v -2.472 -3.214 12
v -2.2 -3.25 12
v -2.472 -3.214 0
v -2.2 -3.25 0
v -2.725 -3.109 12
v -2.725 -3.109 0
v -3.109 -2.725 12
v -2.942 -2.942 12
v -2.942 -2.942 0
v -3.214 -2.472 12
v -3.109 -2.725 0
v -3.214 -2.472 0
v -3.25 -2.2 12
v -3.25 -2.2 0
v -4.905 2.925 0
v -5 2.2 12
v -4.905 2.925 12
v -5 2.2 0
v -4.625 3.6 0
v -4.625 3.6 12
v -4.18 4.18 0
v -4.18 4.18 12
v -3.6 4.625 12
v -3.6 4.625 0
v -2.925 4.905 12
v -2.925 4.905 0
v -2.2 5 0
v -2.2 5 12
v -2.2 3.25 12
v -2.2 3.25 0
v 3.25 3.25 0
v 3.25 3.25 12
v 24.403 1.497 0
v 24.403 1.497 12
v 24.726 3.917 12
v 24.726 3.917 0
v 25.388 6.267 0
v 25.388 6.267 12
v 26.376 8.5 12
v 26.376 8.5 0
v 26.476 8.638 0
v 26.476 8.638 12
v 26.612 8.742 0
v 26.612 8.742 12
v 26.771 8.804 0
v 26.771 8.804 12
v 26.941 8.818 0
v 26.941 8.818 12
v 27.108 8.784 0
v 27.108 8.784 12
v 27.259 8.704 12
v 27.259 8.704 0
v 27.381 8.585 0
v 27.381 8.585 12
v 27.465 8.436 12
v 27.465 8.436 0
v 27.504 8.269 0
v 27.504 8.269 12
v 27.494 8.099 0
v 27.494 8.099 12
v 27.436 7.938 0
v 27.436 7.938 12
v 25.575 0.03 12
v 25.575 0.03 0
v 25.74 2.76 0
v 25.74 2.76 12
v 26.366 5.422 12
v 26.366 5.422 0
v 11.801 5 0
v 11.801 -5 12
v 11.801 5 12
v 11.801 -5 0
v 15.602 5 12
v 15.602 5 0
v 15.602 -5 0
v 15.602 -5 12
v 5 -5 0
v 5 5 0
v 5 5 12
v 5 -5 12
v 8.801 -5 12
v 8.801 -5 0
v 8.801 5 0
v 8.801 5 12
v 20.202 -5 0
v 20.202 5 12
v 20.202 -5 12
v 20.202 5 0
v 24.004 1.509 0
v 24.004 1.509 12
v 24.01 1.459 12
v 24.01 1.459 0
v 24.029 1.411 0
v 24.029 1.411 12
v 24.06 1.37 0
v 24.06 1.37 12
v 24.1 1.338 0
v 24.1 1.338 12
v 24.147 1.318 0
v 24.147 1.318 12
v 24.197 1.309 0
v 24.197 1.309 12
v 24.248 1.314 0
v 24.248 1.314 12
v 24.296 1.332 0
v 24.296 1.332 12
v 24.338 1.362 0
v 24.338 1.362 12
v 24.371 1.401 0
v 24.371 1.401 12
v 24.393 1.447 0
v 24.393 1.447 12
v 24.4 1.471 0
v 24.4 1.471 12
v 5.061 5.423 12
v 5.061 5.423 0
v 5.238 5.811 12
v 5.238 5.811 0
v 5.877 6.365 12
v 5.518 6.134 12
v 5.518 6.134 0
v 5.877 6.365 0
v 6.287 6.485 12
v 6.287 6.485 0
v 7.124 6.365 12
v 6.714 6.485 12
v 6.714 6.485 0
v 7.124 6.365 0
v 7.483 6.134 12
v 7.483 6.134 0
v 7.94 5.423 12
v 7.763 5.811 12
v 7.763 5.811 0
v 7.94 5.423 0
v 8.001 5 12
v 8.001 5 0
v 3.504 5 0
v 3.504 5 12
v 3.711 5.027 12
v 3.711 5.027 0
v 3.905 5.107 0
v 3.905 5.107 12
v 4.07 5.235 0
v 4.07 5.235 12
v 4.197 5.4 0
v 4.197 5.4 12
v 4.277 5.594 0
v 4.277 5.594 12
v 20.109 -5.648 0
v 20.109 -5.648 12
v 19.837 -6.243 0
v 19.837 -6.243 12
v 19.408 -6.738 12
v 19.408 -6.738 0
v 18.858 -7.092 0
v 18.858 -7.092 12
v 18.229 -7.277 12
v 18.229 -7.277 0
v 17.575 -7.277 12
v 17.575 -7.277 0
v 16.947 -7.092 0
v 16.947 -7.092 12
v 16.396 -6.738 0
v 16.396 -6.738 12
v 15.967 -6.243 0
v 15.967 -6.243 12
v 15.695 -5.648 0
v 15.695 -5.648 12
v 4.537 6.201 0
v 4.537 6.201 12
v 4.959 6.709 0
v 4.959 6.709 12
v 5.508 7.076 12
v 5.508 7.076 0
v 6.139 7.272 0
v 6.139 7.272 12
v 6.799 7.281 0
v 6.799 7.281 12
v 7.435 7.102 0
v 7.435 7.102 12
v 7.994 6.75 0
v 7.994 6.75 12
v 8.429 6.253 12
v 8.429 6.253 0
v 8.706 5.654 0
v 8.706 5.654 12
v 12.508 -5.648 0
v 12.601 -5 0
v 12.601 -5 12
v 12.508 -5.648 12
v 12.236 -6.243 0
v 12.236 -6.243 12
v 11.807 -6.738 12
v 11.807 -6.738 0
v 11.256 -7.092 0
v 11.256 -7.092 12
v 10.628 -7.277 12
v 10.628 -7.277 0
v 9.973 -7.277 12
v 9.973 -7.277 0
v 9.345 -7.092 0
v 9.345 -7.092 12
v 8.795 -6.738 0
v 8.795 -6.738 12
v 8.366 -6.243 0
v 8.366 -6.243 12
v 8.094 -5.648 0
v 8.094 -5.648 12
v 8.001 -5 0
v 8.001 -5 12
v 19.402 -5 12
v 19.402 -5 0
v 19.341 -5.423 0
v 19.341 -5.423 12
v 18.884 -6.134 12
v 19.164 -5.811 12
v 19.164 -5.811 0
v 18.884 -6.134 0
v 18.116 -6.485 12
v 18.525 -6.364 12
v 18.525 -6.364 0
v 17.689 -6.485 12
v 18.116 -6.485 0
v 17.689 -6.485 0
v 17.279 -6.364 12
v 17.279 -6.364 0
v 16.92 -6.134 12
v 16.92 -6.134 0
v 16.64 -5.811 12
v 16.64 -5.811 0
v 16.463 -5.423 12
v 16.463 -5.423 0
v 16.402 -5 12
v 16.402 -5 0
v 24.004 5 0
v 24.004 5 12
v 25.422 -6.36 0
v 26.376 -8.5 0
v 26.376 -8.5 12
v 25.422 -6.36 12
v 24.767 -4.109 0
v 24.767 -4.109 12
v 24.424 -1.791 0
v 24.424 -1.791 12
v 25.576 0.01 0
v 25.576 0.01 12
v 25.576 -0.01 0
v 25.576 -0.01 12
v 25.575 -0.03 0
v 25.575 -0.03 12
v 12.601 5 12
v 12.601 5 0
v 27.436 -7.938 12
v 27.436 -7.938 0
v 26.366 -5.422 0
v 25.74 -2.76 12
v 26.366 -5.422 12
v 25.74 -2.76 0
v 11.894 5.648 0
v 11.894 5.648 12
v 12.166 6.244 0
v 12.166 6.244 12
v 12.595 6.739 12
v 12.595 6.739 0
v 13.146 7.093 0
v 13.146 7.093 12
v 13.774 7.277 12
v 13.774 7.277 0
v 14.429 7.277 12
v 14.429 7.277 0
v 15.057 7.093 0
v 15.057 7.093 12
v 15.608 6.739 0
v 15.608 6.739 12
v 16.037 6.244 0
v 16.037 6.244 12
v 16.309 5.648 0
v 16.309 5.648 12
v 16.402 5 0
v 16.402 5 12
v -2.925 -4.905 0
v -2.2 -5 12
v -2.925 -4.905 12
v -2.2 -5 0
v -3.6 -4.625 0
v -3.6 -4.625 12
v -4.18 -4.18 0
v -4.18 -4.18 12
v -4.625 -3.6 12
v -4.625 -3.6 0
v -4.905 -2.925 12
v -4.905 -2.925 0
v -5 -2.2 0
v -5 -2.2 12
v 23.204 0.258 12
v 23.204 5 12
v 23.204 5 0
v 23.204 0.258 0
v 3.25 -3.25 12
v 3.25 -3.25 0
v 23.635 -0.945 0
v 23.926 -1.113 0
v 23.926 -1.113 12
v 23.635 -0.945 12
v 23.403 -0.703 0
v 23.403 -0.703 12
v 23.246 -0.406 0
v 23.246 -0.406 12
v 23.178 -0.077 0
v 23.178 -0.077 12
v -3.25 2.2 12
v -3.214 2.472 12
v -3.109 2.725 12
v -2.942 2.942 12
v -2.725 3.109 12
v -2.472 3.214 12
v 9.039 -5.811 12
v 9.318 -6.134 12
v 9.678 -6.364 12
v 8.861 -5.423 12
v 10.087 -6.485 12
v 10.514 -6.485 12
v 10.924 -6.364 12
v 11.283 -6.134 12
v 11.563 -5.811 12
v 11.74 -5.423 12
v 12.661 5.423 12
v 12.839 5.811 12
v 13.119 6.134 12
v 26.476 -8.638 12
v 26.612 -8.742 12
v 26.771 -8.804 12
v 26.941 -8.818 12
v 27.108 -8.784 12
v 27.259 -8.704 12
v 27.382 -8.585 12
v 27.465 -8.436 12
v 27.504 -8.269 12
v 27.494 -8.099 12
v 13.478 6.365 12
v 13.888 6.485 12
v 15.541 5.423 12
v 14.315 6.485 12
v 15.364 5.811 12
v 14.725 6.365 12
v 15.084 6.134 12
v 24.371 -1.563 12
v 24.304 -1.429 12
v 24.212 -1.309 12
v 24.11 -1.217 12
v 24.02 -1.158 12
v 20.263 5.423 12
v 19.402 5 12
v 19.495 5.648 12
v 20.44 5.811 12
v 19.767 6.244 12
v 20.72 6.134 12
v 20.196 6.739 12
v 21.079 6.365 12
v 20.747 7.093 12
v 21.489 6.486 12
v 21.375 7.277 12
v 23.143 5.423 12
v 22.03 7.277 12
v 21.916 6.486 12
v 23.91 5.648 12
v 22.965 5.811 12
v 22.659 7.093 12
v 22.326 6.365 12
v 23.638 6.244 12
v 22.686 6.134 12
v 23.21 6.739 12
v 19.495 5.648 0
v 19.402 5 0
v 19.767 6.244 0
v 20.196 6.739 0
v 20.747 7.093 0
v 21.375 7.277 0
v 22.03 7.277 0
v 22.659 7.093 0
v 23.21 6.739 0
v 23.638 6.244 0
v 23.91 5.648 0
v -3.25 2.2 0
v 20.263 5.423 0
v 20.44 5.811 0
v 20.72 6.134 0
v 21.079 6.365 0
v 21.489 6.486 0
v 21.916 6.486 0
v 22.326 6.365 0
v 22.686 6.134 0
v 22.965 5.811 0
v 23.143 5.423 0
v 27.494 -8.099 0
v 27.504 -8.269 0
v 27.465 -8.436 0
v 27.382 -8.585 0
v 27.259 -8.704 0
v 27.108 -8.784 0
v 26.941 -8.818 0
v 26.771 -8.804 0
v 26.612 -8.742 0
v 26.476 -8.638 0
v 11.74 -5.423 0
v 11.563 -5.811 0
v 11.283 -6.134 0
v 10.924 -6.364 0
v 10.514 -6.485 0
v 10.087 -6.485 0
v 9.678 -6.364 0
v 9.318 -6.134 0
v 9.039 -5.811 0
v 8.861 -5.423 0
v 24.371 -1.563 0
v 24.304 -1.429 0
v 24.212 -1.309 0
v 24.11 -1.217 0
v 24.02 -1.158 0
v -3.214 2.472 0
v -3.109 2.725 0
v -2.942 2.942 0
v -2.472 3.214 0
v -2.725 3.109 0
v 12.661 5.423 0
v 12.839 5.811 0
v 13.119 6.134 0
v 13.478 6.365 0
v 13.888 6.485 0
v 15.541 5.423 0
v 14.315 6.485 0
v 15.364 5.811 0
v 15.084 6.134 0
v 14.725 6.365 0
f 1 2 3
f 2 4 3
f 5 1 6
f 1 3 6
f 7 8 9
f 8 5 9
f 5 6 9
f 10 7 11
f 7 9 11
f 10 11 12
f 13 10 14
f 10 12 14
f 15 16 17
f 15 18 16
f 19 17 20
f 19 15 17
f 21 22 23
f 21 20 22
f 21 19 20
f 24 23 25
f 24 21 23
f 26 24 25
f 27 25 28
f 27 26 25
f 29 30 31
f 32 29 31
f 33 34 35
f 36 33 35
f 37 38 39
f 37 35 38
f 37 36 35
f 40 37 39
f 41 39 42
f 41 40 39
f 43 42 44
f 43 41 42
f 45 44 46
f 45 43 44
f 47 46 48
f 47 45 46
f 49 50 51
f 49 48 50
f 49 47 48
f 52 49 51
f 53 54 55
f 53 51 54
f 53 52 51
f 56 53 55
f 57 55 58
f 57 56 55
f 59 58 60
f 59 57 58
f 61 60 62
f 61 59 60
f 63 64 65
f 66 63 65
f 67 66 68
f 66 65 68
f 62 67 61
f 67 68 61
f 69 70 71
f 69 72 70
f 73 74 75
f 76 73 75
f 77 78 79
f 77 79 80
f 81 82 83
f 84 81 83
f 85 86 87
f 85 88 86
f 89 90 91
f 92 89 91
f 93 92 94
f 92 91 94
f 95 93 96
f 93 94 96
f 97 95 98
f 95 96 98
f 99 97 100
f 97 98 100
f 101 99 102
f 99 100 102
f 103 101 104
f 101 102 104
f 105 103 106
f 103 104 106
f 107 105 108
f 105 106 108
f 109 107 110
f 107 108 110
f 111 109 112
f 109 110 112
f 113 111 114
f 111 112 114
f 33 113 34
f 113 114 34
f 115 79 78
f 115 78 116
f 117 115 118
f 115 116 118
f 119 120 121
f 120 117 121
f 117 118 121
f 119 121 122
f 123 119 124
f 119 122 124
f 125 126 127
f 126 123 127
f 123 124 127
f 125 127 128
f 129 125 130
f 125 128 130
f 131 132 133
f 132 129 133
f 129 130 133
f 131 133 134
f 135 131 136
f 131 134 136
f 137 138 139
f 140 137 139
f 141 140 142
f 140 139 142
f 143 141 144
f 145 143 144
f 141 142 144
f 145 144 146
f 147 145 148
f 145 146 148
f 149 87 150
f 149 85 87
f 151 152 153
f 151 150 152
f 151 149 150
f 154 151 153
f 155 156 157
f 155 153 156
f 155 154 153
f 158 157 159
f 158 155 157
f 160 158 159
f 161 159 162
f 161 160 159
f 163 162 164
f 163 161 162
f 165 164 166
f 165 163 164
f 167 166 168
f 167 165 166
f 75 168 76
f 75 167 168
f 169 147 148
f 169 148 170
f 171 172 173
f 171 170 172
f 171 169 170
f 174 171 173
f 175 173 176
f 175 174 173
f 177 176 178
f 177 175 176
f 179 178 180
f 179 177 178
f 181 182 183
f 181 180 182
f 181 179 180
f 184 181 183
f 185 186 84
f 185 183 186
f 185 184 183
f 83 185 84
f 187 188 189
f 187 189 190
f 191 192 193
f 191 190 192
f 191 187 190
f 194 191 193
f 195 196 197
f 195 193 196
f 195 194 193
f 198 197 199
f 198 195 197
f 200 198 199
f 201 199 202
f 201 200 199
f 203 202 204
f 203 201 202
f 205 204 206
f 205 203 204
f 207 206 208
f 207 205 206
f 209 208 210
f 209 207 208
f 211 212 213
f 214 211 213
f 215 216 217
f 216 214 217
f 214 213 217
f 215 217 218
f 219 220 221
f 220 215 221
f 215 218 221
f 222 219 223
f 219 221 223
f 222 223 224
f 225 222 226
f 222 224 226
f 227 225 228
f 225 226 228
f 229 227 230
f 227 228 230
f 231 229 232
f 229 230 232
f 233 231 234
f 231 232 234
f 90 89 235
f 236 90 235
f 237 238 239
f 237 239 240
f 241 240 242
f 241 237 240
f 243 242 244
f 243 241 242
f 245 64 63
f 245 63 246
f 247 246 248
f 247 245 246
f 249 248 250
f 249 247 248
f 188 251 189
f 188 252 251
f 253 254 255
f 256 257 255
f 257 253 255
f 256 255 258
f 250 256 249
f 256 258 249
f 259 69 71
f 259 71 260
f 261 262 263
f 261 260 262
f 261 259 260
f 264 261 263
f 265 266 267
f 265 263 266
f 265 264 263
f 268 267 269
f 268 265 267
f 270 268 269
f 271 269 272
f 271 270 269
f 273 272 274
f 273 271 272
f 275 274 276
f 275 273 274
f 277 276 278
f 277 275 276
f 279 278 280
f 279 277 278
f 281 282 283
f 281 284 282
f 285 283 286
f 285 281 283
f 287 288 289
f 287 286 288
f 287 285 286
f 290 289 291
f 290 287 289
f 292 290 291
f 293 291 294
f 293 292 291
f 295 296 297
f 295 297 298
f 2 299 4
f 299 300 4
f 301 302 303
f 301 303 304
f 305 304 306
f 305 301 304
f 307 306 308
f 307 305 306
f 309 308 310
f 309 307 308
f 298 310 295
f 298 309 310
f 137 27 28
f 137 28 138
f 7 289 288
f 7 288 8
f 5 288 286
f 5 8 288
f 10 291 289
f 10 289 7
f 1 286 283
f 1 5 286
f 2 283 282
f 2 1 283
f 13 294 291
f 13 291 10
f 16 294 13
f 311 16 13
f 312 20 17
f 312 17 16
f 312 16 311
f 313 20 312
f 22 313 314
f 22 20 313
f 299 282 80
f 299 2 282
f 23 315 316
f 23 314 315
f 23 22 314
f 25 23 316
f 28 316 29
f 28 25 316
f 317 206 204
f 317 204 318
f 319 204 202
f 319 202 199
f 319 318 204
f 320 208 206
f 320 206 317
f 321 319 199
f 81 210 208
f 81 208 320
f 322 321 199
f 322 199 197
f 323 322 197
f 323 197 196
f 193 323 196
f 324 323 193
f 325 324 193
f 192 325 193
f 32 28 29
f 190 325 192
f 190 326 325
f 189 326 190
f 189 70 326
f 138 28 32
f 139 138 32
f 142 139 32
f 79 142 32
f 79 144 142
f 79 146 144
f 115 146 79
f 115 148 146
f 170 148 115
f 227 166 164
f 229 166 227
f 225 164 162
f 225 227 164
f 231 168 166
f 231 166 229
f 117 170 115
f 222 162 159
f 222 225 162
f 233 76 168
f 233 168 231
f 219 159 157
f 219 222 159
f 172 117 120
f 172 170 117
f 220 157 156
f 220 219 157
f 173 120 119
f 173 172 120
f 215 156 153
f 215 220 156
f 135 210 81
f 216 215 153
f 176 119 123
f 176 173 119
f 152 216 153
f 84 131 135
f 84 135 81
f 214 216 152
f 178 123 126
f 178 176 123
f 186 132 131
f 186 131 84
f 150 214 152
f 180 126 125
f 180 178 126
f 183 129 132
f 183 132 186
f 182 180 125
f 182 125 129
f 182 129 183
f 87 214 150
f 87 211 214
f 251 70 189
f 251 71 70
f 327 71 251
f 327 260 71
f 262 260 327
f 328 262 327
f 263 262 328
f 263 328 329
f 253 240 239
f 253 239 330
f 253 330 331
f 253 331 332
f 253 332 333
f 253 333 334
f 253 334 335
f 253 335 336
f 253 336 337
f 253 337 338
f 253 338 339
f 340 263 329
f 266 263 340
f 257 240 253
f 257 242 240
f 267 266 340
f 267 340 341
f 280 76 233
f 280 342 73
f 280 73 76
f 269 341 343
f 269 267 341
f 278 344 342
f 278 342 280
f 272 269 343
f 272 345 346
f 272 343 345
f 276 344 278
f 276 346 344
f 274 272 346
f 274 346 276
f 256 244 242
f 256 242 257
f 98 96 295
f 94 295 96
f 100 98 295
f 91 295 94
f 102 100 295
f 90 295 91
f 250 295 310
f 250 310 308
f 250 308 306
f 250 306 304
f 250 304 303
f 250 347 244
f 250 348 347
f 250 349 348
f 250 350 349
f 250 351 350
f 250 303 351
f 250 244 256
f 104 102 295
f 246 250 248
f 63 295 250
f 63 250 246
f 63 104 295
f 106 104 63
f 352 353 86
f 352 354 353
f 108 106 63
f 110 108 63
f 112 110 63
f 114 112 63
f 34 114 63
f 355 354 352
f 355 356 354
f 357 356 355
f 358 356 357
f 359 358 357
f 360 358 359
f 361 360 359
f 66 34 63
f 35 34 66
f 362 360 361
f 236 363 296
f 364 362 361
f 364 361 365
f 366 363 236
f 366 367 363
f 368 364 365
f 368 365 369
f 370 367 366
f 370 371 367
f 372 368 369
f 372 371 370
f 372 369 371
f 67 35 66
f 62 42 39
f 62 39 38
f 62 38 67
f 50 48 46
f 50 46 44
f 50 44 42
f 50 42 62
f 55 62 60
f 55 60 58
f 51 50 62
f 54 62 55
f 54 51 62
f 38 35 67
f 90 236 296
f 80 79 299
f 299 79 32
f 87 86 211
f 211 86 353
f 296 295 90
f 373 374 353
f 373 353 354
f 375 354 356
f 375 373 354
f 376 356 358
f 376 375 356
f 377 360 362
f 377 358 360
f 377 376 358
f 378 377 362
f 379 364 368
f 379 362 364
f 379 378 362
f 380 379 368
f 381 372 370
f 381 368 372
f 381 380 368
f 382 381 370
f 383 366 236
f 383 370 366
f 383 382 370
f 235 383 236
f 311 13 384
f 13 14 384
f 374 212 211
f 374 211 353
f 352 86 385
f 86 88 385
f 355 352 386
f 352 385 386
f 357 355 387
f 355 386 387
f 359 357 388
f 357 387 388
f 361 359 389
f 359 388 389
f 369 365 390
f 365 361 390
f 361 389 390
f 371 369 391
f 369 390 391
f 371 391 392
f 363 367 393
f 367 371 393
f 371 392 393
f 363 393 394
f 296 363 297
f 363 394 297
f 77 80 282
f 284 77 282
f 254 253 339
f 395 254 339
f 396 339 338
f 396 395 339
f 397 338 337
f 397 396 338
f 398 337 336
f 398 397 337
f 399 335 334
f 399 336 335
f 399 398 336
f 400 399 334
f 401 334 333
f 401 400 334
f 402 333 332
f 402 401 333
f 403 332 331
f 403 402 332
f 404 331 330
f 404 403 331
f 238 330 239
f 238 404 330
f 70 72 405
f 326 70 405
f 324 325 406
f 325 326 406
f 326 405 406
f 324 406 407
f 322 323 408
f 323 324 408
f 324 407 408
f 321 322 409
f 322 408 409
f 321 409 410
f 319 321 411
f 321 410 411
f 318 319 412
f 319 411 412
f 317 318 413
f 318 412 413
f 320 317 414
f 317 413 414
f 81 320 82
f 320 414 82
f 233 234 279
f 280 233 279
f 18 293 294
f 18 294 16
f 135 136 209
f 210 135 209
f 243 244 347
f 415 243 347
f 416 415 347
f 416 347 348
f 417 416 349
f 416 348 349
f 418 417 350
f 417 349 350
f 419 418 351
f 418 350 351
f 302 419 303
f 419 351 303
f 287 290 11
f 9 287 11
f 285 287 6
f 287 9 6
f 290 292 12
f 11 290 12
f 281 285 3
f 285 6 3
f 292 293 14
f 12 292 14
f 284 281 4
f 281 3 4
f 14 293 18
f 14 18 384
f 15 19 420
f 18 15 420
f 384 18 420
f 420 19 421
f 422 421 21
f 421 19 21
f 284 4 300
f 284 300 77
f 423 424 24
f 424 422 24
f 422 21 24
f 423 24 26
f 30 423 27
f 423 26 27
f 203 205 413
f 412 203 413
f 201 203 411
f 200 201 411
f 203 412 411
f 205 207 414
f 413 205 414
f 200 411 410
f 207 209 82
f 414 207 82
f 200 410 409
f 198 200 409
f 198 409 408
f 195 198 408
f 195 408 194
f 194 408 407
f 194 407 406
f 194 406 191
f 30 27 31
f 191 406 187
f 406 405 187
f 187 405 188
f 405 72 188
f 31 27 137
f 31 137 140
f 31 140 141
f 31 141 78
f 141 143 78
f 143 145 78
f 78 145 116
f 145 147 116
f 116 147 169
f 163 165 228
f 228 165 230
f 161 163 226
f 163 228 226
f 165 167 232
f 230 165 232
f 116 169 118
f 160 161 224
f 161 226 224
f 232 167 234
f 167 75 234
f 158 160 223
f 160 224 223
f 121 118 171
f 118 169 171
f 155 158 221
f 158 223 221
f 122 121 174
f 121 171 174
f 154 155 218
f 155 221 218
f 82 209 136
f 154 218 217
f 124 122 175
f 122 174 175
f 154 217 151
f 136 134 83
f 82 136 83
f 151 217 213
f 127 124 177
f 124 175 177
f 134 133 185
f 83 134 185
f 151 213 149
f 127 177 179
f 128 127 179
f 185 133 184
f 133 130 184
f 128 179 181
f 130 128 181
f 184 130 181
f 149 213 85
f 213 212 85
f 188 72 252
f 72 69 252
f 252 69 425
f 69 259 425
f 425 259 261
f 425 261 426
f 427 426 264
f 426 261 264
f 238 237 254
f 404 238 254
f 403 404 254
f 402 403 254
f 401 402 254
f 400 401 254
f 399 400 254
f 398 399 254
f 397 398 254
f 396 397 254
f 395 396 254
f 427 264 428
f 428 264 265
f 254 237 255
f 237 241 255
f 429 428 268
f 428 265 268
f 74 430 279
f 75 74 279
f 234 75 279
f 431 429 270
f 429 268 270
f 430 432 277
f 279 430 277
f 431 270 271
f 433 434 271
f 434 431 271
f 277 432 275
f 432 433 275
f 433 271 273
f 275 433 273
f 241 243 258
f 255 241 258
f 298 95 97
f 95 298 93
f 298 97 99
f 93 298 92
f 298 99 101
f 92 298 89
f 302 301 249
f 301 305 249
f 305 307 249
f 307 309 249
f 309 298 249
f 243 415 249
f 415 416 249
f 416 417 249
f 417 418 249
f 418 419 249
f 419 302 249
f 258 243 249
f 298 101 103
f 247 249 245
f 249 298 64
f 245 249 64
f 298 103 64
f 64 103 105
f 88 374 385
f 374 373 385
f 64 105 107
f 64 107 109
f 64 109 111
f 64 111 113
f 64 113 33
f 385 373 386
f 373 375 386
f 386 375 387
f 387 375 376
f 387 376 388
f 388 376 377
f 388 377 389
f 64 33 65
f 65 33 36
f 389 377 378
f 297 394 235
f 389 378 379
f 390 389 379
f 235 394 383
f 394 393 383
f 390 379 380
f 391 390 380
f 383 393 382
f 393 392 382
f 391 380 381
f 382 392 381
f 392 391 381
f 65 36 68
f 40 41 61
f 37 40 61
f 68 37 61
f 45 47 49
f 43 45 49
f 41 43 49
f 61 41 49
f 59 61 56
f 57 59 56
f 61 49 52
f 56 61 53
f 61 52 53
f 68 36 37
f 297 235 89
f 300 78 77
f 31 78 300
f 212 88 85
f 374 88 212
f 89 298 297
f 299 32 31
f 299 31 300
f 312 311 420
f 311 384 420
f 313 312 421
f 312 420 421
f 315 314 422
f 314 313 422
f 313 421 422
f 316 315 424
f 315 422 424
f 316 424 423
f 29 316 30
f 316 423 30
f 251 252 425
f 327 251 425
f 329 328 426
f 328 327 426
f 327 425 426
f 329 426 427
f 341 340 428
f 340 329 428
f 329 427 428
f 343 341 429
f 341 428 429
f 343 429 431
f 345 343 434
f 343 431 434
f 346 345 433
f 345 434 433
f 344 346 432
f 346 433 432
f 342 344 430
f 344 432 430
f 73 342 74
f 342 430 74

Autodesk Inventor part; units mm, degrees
ref_plane "YZ Plane" through (0, 0, 0) normal (1, 0, 0) x (0, 1, 0)
ref_plane "XZ Plane" through (0, 0, 0) normal (0, 1, 0) x (-1, 0, 0)
ref_plane "XY Plane" through (0, 0, 0) normal (0, 0, 1) x (1, 0, 0)
sketch "Boceto1" plane through (0, 0, 0) normal (0, 0, 1) x (1, 0, 0)
  line L0 (3, -11.4) -> (3, -5.5)
  line L1 (3, -5.5) -> (-2.2, -5.5)
  arc A0 (-5.5, -2.2) -> (-2.2, -5.5) centre (-2.2, -2.2) ccw
  line L2 (-5.5, -2.2) -> (-5.5, 2.2)
  arc A1 (-2.2, 5.5) -> (-5.5, 2.2) centre (-2.2, 2.2) ccw
  line L3 (-2.2, 5.5) -> (3, 5.5)
  line L4 (3, 5.5) -> (3, 11.4)
  line L5 (3, 3) -> (-2.2, 3)
  arc A2 (-2.2, 3) -> (-3, 2.2) centre (-2.2, 2.2) ccw
  line L6 (-3, 2.2) -> (-3, -2.2)
  arc A3 (-3, -2.2) -> (-2.2, -3) centre (-2.2, -2.2) ccw
  line L7 (-2.2, -3) -> (3, -3)
  line L8 (3, -3) -> (3, 3)
  line L9 (-2.2, 3.25) -> (3.25, 3.25)
  line L10 (3.25, 3.25) -> (3.25, -3.25)
  line L11 (3.25, -3.25) -> (-2.2, -3.25)
  arc A4 (-3.25, -2.2) -> (-2.2, -3.25) centre (-2.2, -2.2) ccw
  line L12 (-3.25, -2.2) -> (-3.25, 2.2)
  arc A5 (-2.2, 3.25) -> (-3.25, 2.2) centre (-2.2, 2.2) ccw
  line L13 (-2.2, 5) -> (5, 5)
  line L14 (5, 5) -> (5, -5)
  line L15 (5, -5) -> (-2.2, -5)
  arc A6 (-5, -2.2) -> (-2.2, -5) centre (-2.2, -2.2) ccw
  line L16 (-5, -2.2) -> (-5, 2.2)
  arc A7 (-2.2, 5) -> (-5, 2.2) centre (-2.2, 2.2) ccw
  line L17 (5, 0) -> (23, 0)
  line L18 (5, 5) -> (6.5, 5)
  line L19 (8.8007, 5) -> (8.0007, 5)
  line L20 (8.0007, 5) -> (8.0007, -5)
  line L21 (8.0007, -5) -> (8.8007, -5)
  line L22 (8.8007, -5) -> (8.8007, 5)
  line L23 (8.8007, -5) -> (10.3007, -5)
  line L24 (12.6007, -5) -> (11.8007, -5)
  line L25 (11.8007, -5) -> (11.8007, 5)
  line L26 (11.8007, 5) -> (12.6007, 5)
  line L27 (12.6007, 5) -> (12.6007, -5)
  arc A8 (8.8007, -5) -> (11.8007, -5) centre (10.3007, -5) ccw
  arc A9 (8.0007, -5) -> (12.6007, -5) centre (10.3007, -5) ccw
  arc A10 (8.0007, 5) -> (4.9993, 5) centre (6.5, 5) ccw
  arc A11 (8.8007, 5) -> (4.1993, 5) centre (6.5, 5) ccw
  line L28 (16.4021, 5) -> (15.6021, 5)
  line L29 (15.6021, 5) -> (15.6021, -5)
  line L30 (15.6021, -5) -> (16.4021, -5)
  line L31 (16.4021, -5) -> (16.4021, 5)
  line L32 (20.2021, -5) -> (19.4021, -5)
  line L33 (19.4021, -5) -> (19.4021, 5)
  line L34 (19.4021, 5) -> (20.2021, 5)
  line L35 (20.2021, 5) -> (20.2021, -5)
  arc A12 (16.4021, -5) -> (19.4021, -5) centre (17.9021, -5) ccw
  arc A13 (15.6021, -5) -> (20.2021, -5) centre (17.9021, -5) ccw
  arc A14 (15.6021, 5) -> (12.6007, 5) centre (14.1014, 5) ccw
  arc A15 (16.4021, 5) -> (11.8007, 5) centre (14.1014, 5) ccw
  line L36 (24.0036, 5) -> (23.2036, 5)
  line L37 (23.2036, 5) -> (23.2036, -0.2574)
  line L38 (23.2036, -5) -> (24.0036, -5)
  line L39 (24.0036, -1.1409) -> (24.0036, 5)
  arc A16 (23.2036, 5) -> (20.2021, 5) centre (21.7028, 5) ccw
  arc A17 (24.0036, 5) -> (19.4021, 5) centre (21.7028, 5) ccw
  arc A18 (26.3756, 8.5) -> (24.3756, 0) centre (41.5966, 0.4333) ccw
  circle A19 centre (24.3756, 0) radius 1.2
  arc A20 (27.4359, 7.9381) -> (25.5752, 0.0302) centre (41.5966, 0.4333) ccw
  line L40 (25.6, 8.5) -> (25.9736, 8.302)
  arc A21 (27.4359, 7.9381) -> (26.3756, 8.5) centre (26.9058, 8.219) ccw
  arc A22 (24.3756, 0) -> (26.3756, -8.5) centre (41.5966, -0.4333) ccw
  arc A23 (26.3756, -8.5) -> (27.4359, -7.9381) centre (26.9058, -8.219) ccw
  line L41 (26.7492, -8.302) -> (27.4359, -7.9381)
  arc A24 (25.5752, -0.0302) -> (27.4359, -7.9381) centre (41.5966, -0.4333) ccw
  line L42 (23.2036, 0) -> (24.0036, 0)
  point P0 (0, 0)
  point P1 (5, -5)
  point P2 (4.2, -5)
  point P3 (3.8, 5)
  point P4 (25.5036, -5)
  point P5 (22.4, 0)
  point P6 (24.3872, 1.1999)
  point P7 (24.0036, 1.1409)
  point P8 (23.2036, 0.2574)
  point P9 (24.3872, -1.1999)
  point P10 (25.5752, -0.0302)
  point P11 (25.5752, 0.0302)
  dimension "d1" = 0.25
  dimension "d2" = 2
  dimension "d42" = 18
  dimension "d43" = 1.5
  dimension "d45" = 0.8
  dimension "d46" = 10
  dimension "d47" = 1.5
  dimension "d48" = 0.8
  dimension "d49" = 10
  dimension "d50" = 0.8
  dimension "d51" = 10
  dimension "d52" = 1.5
  dimension "d53" = 0.8
  dimension "d54" = 10
  dimension "d55" = 0.8
  dimension "d56" = 10
  dimension "d57" = 1.5
  dimension "d62" = 1.2
extrude "Extrusión1" add sketch "Boceto1" along normal blind 12 contours L13 L14 L15 A6 L16 A7 | A11 L19 A10 L13 | L22 L17 L20 L19 | L22 L21 L20 L17 | L25 L26 L27 L17 | L17 L27 L24 L25 | A8 L24 A9 L21 | A15 L28 A14 L26 | L29 L28 L31 L17 | L17 L31 L30 L29 | L30 A12 L32 A13 | L33 L34 L35 L17 | L17 L35 L32 L33 | A17 L36 A16 L34 | L39 A19 L37 L36 | A19 A18 A22 L39 | L39 L42 L37 A19 | L37 A19 | L39 A19 L37 L42 | A19 A22 A18 | A18 A21 A20 A19 | A19 A24 A23 A22
fillet "Empalme1" radius 0.8 2 edges at (4.1993, 5, 6) (24.3872, -1.1999, 6)
fillet "Empalme1" radius 0.2 2 edges at (24.0036, 1.1409, 6) (24.3872, 1.1999, 6)
properties part number "_3DPrint"
